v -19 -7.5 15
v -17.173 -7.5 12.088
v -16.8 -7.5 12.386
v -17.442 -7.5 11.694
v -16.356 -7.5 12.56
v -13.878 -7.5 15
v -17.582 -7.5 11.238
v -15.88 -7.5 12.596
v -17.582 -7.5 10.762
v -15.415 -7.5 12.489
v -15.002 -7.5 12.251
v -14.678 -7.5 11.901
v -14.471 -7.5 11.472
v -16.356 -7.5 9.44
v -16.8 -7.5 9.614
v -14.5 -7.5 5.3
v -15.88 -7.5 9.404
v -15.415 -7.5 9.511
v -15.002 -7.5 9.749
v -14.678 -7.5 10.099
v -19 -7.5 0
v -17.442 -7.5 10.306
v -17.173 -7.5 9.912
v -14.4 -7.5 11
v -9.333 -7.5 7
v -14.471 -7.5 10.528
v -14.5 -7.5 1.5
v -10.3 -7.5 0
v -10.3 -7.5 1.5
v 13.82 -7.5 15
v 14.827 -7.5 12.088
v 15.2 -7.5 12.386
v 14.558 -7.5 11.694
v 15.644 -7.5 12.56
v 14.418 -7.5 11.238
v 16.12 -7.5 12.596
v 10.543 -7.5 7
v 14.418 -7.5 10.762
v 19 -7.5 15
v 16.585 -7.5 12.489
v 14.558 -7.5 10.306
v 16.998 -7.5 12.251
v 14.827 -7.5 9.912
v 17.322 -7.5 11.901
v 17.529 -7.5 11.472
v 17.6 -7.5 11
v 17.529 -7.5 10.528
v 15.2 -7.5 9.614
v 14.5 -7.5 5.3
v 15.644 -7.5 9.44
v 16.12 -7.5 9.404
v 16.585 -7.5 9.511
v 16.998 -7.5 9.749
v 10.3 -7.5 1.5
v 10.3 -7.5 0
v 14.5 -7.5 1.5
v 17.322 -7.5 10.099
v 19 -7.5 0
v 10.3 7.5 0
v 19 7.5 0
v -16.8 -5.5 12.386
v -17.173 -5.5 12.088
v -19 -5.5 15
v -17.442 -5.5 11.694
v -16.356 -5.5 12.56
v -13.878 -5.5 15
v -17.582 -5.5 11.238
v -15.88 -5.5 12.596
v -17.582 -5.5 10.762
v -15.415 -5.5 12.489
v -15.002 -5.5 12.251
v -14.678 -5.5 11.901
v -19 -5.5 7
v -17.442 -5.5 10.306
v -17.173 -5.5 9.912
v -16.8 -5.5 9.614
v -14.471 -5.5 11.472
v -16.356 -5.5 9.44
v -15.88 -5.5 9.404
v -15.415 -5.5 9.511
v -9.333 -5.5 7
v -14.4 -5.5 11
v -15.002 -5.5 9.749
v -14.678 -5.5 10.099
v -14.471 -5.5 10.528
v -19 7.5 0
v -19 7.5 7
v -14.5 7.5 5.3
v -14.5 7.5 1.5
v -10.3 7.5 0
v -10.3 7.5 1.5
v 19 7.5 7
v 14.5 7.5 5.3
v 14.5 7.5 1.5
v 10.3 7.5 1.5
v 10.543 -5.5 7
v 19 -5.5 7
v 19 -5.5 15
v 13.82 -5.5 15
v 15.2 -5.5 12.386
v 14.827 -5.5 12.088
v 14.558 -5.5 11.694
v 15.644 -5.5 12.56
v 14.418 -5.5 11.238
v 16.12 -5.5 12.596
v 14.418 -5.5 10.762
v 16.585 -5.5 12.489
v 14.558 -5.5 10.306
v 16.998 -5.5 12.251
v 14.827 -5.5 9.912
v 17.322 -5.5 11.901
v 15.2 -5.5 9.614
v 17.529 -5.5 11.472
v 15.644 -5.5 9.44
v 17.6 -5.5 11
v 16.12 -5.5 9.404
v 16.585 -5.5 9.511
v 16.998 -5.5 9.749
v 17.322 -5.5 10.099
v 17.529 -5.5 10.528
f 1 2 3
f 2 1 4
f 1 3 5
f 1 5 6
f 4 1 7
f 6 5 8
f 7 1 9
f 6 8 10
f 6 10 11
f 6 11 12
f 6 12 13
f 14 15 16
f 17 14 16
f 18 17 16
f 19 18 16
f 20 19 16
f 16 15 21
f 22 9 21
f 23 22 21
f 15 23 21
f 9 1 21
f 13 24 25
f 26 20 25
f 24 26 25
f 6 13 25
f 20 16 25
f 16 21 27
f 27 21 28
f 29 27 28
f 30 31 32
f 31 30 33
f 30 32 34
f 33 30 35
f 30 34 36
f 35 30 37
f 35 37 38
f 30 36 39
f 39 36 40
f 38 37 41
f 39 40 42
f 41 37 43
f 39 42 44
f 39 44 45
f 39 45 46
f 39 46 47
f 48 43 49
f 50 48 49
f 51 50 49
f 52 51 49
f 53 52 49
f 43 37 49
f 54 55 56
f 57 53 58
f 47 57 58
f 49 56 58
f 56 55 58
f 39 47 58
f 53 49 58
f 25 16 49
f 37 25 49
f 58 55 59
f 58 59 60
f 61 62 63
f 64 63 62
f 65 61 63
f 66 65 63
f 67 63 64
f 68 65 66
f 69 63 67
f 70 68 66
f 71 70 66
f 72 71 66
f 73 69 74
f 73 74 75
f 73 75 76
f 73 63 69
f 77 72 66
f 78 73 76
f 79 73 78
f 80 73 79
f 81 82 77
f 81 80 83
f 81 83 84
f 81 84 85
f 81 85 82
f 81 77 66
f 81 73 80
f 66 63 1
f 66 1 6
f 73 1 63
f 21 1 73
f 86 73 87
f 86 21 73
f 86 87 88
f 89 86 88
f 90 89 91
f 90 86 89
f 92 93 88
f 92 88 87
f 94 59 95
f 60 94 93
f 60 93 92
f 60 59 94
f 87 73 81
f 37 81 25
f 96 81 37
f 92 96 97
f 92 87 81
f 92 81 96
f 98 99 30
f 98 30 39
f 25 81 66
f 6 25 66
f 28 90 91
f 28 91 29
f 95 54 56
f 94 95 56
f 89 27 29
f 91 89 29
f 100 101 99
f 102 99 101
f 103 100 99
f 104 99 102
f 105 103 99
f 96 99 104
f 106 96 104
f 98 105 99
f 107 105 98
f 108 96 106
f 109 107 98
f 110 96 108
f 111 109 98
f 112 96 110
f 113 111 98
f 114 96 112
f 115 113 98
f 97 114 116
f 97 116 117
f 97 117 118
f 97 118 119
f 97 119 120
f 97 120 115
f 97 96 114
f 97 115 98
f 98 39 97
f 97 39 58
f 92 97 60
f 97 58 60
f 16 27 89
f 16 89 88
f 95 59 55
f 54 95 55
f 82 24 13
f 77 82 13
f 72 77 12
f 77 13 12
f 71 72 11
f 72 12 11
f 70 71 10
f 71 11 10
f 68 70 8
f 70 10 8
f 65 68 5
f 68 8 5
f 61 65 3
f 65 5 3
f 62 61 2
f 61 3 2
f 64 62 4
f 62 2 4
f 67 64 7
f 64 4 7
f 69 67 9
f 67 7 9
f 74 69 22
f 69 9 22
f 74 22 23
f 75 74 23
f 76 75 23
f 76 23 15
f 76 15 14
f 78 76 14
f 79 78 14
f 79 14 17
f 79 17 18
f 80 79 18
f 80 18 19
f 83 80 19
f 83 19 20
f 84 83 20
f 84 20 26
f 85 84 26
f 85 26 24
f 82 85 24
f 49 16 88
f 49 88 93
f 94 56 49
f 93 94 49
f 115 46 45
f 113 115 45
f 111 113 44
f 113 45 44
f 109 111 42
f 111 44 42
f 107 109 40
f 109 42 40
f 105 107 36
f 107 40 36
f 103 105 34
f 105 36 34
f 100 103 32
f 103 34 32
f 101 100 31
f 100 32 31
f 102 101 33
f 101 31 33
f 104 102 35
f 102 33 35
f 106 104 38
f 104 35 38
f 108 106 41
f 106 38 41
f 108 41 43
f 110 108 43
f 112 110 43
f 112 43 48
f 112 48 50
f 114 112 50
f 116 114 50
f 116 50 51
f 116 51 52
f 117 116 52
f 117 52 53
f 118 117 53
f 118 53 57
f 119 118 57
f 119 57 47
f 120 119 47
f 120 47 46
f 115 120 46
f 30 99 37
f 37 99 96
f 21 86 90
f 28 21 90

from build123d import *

# Parameters (mm, degrees)
F0_W      = 38
F0_H      = 15
F1_DEPTH  = 7
F2_W      = 29
F2_H      = 3.8
F3_DEPTH  = 30
F5_W      = 20.6003077328
F5_H      = 15
F6_DEPTH  = 5
F4_W      = 38
F4_H      = 2
F7_DEPTH  = 8
F9_D      = 3.2
F10_DEPTH = 25


with BuildPart() as f1:
    # F0 (on Top) → F1 (new body)
    with BuildSketch(Plane.XY):
        Rectangle(F0_W, F0_H)
    extrude(amount=F1_DEPTH)

    # F2 (on face) → F3 (cut)
    with BuildSketch(Plane.XZ.offset(7.5)):
        with Locations((0, 3.4002120374)):
            Rectangle(F2_W, F2_H)
    extrude(amount=-F3_DEPTH, mode=Mode.SUBTRACT)

    # F5 (on face) → F6 (cut)
    with BuildSketch(Plane(origin=(0, 0, 0), x_dir=(1, 0, 0), z_dir=(0, 0, -1))):
        Rectangle(F5_W, F5_H)
    extrude(amount=-F6_DEPTH, mode=Mode.SUBTRACT)

    # F4 (on face) → F7 (join)
    with BuildSketch(Plane.XY.offset(7)):
        with Locations((0, -6.5)):
            Rectangle(F4_W, F4_H)
    extrude(amount=F7_DEPTH)

    # F9 (through all)
    with Locations(Plane(origin=(0, -5.5, 0), x_dir=(-1, 0, 0), z_dir=(0, 1, 0))):
        with Locations((16, 11), (-16, 11)):
            Hole(F9_D / 2)

    # F8 (on face) → F10 (cut)
    with BuildSketch(Plane(origin=(0, -5.5, 0), x_dir=(-1, 0, 0), z_dir=(0, 1, 0))):
        Polygon((9.3329623342, 7), (13.877848681, 15), (-13.8199780472, 15), (-10.5432244018, 7), align=None)
    extrude(amount=-F10_DEPTH, mode=Mode.SUBTRACT)


solid = f1.part
